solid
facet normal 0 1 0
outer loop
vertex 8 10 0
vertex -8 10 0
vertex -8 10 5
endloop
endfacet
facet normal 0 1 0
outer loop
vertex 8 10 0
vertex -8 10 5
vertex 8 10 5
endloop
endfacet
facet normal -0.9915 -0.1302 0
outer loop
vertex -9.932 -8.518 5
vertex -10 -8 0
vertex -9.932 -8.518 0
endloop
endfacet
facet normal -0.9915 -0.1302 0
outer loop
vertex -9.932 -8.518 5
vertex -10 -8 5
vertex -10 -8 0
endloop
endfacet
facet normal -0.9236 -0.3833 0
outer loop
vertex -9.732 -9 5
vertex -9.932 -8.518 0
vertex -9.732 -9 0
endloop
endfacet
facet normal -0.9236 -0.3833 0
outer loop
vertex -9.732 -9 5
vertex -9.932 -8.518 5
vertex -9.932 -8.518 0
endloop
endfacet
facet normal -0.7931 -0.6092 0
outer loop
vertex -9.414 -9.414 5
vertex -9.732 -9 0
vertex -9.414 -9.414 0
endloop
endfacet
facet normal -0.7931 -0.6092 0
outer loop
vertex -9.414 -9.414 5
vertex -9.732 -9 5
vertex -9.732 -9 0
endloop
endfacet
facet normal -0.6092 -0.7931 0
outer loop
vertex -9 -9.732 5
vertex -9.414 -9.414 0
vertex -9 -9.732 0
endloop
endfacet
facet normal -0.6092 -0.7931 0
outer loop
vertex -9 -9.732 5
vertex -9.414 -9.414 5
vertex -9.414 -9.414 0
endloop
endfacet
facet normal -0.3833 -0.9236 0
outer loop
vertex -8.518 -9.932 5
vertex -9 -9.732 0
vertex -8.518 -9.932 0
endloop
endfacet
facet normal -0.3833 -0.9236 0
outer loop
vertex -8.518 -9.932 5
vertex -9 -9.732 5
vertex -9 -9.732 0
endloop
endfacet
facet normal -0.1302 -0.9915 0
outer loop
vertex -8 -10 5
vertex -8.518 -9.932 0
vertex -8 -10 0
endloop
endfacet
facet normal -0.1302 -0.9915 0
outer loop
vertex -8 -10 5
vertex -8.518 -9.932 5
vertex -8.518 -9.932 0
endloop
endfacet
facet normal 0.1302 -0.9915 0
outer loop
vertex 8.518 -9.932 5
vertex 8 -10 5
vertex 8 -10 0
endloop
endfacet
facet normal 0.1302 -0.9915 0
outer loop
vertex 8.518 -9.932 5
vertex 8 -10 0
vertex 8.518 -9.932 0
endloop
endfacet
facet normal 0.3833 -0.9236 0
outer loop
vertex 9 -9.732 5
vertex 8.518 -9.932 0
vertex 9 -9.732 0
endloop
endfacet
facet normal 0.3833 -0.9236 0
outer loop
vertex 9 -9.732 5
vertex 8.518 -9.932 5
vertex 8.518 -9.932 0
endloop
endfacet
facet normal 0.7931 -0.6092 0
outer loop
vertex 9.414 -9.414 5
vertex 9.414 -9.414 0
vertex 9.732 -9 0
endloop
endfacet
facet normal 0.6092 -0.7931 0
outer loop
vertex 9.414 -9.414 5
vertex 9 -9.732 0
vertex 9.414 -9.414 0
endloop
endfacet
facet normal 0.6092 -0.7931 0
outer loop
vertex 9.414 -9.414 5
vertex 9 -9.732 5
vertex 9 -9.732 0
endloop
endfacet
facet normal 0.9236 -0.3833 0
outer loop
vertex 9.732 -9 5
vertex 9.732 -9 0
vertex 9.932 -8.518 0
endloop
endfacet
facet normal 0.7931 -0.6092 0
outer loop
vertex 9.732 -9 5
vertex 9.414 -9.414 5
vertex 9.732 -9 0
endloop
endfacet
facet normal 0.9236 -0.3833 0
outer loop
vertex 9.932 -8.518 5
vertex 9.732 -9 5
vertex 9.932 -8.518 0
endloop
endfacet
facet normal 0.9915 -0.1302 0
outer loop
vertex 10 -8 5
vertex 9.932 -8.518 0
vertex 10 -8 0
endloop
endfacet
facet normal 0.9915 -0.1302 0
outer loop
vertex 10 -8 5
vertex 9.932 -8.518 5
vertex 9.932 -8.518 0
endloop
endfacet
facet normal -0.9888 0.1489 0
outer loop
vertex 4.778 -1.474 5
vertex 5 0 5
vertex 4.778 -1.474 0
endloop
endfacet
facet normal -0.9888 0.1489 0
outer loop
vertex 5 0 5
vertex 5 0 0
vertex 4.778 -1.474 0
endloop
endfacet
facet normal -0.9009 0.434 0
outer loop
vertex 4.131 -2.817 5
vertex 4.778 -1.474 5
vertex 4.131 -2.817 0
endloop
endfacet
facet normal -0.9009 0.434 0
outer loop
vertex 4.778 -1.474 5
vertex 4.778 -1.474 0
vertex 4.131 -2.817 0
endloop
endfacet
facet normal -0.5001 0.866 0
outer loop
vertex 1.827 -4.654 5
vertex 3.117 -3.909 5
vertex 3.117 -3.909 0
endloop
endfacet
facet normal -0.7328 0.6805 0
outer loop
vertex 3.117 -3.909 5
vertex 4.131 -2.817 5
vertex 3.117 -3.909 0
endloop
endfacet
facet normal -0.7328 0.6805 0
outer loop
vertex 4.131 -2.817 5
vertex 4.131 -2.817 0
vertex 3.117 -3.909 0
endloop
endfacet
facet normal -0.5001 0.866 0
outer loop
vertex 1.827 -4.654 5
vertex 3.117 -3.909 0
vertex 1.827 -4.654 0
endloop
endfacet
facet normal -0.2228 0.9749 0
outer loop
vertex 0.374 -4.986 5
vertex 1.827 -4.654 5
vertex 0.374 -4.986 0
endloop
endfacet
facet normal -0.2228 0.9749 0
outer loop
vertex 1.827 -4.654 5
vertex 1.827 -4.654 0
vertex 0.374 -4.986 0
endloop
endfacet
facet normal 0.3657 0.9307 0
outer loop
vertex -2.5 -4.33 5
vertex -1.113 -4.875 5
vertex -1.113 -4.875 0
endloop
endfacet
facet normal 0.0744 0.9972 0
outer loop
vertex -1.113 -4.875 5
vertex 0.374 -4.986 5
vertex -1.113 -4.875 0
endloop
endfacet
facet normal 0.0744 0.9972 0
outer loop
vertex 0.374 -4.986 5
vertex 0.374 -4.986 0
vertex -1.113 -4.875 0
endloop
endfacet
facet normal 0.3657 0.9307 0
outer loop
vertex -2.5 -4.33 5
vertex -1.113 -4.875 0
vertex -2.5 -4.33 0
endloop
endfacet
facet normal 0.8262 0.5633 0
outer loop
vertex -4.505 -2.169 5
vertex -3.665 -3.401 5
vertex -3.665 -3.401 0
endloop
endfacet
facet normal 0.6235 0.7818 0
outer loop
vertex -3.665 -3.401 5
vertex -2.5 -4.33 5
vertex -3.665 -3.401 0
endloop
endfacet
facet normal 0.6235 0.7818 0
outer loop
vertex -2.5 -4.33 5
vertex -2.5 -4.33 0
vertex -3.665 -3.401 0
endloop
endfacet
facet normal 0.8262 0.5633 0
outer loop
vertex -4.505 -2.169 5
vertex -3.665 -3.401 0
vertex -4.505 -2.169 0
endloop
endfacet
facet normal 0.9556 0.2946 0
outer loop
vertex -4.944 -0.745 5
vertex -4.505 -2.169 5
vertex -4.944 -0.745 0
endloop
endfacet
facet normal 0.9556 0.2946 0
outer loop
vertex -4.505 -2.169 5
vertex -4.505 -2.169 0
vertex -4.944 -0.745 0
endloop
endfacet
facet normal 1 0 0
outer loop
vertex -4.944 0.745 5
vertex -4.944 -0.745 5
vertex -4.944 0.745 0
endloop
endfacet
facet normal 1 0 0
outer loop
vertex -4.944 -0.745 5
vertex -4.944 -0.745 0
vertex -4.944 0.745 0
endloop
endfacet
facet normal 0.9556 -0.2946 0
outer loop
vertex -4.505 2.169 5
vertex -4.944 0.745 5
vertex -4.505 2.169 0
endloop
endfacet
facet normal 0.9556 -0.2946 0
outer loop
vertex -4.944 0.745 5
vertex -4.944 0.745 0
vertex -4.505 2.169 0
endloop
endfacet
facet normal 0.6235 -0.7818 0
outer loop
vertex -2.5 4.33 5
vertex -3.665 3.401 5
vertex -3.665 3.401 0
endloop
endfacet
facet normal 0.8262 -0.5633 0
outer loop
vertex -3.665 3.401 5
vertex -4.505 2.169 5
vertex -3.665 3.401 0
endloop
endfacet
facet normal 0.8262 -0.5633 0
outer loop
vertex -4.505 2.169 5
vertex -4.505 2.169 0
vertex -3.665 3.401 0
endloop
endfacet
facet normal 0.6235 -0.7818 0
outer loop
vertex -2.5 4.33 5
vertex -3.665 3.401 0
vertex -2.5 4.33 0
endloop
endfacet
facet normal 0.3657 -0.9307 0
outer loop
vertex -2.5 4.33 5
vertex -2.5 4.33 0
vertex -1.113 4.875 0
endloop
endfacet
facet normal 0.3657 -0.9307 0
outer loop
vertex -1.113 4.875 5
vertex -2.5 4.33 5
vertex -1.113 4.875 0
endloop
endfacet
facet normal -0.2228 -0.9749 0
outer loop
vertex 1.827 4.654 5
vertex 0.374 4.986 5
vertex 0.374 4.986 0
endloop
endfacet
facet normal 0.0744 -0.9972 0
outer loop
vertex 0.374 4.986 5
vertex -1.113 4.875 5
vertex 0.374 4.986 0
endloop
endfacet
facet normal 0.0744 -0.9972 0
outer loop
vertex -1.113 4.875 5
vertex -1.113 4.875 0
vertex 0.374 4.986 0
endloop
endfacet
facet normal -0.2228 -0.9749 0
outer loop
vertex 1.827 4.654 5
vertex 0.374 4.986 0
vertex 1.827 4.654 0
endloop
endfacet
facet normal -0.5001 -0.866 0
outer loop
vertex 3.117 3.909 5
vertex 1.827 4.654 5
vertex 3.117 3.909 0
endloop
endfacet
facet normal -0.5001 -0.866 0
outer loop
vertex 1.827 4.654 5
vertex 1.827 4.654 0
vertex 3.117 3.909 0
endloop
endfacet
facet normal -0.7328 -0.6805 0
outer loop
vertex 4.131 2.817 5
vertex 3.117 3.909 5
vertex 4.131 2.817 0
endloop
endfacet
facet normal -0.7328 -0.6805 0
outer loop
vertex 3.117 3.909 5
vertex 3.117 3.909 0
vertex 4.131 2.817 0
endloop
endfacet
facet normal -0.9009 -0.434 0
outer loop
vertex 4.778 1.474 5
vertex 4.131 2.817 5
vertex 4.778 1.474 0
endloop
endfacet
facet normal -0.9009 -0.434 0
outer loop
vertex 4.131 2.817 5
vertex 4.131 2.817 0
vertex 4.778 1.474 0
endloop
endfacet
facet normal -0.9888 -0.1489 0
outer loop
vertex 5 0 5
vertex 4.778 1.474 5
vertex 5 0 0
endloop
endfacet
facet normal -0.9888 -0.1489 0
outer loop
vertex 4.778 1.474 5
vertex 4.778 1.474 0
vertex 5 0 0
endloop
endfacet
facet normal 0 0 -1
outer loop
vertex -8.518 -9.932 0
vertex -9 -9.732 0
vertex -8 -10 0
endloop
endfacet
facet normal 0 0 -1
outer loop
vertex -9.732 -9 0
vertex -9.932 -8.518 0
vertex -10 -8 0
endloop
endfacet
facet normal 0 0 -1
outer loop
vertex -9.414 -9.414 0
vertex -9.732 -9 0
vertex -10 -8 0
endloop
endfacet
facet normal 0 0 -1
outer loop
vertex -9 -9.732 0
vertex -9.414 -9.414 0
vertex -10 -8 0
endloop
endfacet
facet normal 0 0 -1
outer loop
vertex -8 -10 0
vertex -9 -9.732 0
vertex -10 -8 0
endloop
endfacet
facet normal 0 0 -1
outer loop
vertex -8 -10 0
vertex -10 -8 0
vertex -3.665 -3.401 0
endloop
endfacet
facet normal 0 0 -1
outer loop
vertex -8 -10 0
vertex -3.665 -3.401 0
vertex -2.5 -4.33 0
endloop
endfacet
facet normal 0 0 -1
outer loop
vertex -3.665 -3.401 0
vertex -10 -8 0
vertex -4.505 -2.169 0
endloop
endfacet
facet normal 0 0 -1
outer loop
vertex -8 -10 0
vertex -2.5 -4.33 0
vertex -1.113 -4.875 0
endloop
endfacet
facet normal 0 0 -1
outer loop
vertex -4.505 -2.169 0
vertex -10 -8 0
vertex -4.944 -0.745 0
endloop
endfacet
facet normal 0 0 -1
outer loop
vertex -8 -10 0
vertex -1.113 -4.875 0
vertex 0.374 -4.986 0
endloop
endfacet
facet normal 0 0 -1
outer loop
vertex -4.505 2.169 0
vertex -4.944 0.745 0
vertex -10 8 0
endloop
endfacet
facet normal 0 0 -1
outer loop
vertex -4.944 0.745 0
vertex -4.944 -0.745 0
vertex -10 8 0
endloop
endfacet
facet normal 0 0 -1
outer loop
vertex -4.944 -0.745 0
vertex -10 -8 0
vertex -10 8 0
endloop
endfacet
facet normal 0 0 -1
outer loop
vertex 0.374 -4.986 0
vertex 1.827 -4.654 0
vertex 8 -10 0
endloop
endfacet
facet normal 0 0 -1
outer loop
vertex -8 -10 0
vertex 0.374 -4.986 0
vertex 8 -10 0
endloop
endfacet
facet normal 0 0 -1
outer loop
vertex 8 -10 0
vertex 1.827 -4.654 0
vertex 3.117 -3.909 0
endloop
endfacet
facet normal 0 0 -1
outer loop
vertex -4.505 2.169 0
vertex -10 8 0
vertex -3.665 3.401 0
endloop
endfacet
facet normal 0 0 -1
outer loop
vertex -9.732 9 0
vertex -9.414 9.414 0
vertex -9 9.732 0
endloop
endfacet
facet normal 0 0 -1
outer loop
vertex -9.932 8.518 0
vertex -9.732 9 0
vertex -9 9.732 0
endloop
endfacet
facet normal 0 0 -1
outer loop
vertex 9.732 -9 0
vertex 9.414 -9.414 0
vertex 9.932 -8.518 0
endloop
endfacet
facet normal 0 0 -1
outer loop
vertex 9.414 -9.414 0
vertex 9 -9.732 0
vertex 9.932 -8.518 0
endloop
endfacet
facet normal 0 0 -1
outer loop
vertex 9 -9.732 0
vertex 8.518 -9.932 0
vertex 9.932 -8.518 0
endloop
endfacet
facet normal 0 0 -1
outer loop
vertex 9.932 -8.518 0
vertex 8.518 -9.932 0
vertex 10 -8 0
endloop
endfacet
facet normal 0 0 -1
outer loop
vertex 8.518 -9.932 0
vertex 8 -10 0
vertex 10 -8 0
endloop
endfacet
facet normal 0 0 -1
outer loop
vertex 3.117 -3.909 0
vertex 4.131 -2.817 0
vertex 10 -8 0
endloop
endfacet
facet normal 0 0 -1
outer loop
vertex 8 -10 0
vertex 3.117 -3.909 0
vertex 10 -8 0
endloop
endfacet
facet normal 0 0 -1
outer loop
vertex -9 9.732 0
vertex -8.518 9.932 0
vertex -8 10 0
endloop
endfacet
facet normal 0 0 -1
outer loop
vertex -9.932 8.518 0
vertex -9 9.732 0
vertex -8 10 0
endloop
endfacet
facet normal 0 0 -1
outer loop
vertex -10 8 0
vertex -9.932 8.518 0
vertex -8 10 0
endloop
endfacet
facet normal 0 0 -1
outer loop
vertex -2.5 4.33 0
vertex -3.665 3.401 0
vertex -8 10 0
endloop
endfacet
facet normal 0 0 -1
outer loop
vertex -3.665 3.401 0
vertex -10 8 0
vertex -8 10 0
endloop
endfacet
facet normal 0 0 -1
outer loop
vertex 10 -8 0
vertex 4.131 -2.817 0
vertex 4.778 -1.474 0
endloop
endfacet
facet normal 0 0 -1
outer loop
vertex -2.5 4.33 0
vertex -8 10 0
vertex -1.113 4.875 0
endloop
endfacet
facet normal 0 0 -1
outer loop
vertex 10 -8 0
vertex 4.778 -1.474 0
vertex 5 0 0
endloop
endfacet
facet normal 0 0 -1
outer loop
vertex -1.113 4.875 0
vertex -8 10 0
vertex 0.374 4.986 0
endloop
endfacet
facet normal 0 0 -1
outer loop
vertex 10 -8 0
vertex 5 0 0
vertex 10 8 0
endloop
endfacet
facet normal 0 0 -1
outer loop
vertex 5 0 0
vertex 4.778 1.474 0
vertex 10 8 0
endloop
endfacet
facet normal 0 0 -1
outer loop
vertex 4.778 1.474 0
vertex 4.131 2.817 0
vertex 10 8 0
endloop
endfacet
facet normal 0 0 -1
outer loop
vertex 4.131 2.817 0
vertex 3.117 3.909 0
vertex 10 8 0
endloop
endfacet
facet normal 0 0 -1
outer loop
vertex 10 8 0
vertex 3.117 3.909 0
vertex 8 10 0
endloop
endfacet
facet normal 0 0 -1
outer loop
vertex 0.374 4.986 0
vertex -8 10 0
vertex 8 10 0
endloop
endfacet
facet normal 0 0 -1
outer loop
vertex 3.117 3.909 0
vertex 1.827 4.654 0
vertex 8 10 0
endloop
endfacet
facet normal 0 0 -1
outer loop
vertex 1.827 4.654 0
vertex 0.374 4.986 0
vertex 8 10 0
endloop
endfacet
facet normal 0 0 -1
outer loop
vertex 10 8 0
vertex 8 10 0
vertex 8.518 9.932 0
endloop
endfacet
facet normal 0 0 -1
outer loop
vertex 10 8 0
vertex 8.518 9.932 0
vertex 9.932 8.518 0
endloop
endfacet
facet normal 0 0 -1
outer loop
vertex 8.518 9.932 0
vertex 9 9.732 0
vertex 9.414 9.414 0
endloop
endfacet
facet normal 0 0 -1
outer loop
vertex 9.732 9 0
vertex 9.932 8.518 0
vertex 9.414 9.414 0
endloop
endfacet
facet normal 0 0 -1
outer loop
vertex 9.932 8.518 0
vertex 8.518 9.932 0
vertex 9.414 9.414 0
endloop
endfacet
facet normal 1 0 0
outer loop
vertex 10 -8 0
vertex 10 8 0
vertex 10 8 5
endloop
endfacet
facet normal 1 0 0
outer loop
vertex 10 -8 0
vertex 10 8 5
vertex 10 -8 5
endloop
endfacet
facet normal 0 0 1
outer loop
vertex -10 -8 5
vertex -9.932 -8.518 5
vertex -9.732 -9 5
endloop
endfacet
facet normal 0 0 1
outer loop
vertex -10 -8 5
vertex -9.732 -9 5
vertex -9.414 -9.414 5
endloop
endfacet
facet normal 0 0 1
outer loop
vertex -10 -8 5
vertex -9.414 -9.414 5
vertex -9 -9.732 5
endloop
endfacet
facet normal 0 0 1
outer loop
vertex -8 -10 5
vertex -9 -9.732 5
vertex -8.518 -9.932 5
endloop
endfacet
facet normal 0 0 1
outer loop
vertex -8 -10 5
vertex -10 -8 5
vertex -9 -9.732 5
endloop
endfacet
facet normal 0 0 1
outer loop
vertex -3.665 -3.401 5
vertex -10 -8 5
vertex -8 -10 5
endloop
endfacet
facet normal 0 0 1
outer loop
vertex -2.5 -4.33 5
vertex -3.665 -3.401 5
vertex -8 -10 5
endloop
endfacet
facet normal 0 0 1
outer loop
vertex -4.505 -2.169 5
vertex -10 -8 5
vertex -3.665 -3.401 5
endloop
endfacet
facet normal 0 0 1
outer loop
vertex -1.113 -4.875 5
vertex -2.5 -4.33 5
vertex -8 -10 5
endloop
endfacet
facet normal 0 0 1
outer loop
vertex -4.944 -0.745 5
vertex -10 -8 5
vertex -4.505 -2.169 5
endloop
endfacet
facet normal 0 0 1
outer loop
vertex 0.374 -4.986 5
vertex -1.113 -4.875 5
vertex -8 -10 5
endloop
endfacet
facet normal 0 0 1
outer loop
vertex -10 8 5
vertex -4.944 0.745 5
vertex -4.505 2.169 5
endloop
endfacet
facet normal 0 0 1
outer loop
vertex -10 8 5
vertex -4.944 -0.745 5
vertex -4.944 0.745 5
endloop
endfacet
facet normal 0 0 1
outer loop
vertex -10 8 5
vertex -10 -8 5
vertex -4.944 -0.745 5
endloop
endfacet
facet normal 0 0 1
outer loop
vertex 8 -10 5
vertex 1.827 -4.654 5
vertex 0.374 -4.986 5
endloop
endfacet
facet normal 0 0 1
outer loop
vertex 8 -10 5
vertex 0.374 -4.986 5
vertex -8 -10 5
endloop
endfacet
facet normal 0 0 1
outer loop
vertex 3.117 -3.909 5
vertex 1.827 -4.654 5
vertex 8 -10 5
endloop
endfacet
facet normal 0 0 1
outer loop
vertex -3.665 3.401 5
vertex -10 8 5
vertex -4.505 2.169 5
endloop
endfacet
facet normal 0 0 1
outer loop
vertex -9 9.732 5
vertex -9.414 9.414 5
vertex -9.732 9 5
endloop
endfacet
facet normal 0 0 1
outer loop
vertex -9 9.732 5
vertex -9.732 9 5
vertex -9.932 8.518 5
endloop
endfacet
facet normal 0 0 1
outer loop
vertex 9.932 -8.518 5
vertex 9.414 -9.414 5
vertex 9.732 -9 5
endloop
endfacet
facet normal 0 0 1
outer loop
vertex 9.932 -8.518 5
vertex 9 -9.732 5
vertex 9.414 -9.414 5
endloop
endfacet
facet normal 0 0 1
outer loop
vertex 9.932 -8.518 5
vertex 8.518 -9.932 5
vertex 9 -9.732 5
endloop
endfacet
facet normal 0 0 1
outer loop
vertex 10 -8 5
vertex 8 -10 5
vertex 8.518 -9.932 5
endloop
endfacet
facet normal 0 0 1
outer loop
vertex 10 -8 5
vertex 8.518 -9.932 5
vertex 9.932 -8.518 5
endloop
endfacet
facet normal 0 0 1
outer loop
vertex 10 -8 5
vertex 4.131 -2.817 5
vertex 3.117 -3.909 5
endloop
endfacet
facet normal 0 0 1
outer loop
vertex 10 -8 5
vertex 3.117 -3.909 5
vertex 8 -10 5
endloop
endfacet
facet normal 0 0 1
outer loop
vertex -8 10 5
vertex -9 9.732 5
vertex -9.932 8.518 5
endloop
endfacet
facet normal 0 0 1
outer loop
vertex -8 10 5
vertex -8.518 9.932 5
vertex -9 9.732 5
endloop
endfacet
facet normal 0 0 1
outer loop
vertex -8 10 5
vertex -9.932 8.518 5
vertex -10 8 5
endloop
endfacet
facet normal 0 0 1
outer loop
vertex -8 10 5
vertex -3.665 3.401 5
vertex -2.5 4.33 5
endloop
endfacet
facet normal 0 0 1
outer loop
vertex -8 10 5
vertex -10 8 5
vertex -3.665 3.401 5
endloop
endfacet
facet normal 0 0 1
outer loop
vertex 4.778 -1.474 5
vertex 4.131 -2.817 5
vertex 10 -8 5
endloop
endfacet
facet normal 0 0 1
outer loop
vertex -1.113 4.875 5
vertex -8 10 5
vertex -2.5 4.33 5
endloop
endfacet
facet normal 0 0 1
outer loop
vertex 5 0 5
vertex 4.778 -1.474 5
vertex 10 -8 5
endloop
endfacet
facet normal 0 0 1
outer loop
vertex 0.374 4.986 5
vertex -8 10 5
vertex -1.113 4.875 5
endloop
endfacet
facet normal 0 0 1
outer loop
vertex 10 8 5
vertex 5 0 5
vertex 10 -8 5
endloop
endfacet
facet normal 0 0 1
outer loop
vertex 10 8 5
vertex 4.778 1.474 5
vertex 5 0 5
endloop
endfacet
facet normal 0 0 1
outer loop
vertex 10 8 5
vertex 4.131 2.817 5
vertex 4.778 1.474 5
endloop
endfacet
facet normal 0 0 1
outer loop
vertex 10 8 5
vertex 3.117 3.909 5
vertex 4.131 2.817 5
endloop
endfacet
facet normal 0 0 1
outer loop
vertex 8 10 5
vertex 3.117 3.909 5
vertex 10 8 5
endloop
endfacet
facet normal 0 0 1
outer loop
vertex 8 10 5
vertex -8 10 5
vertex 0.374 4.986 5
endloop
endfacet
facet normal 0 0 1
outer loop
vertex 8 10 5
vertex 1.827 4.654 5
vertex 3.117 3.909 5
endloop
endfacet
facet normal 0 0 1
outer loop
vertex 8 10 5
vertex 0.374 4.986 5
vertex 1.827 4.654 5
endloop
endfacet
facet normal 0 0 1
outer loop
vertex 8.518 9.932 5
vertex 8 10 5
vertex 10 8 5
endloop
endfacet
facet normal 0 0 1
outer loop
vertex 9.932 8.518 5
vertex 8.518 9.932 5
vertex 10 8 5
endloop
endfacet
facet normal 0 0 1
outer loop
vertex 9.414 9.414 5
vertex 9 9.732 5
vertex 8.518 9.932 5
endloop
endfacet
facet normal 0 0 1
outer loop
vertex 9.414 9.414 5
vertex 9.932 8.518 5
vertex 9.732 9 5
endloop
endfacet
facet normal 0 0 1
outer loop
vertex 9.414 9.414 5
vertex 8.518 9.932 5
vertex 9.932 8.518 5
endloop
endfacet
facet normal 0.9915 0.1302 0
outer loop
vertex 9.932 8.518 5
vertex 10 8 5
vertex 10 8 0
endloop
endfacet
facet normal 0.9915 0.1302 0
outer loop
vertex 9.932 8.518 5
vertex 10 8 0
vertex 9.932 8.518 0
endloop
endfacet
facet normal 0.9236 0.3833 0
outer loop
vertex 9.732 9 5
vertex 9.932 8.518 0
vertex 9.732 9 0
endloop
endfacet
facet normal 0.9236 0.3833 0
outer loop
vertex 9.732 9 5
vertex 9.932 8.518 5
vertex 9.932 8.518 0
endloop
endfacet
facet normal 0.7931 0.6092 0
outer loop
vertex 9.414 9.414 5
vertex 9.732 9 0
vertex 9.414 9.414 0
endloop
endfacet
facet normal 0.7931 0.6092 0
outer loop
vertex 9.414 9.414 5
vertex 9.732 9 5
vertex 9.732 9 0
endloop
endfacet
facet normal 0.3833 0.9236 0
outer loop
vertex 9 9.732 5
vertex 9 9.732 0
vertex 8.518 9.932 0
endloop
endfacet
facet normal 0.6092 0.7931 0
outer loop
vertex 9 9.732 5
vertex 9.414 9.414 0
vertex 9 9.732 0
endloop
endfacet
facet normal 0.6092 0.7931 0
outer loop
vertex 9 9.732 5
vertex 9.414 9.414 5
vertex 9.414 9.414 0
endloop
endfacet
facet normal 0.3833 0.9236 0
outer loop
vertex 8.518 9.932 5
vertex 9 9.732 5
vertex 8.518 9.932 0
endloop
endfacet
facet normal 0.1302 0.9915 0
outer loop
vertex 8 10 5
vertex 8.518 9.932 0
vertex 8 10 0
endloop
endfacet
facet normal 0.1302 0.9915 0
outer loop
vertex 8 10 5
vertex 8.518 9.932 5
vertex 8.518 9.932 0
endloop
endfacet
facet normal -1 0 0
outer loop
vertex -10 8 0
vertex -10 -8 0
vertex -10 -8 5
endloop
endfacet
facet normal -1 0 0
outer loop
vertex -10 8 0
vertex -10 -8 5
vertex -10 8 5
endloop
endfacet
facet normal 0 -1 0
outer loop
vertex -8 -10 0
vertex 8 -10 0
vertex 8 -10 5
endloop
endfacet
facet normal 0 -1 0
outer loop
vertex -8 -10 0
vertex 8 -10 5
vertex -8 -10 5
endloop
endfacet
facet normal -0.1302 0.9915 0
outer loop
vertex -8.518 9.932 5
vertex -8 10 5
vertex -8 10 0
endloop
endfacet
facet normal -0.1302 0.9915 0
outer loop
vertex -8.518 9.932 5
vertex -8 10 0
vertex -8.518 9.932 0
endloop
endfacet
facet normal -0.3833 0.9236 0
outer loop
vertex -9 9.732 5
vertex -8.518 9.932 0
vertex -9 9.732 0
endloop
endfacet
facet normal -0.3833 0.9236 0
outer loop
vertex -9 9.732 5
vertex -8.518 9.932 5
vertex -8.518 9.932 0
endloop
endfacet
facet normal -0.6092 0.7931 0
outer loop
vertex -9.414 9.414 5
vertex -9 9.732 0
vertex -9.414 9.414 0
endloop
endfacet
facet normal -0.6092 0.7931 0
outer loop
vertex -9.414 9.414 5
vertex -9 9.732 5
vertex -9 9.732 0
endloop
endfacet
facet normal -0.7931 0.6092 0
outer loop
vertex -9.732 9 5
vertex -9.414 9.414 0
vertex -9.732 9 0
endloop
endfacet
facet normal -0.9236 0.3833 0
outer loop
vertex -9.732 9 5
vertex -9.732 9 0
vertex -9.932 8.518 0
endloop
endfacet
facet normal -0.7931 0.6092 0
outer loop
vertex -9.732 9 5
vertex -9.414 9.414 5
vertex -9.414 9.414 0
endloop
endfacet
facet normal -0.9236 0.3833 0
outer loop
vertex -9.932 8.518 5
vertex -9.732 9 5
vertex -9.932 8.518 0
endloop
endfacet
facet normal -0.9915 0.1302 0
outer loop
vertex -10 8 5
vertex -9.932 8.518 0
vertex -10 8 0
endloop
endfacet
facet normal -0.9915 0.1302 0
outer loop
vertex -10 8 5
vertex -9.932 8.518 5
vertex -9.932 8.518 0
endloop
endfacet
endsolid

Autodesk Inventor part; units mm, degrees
ref_plane "YZ Plane" through (0, 0, 0) normal (1, 0, 0) x (0, 1, 0)
ref_plane "XZ Plane" through (0, 0, 0) normal (0, 1, 0) x (-1, 0, 0)
ref_plane "XY Plane" through (0, 0, 0) normal (0, 0, 1) x (1, 0, 0)
sketch "スケッチ1" plane through (0, 0, 0) normal (0, 0, 1) x (1, 0, 0)
  line L0 (-10, 10) -> (10, 10)
  line L1 (10, 10) -> (10, -10)
  line L2 (10, -10) -> (-10, -10)
  line L3 (-10, -10) -> (-10, 10)
  point P0 (0, 0)
  dimension "d0" = 20
  dimension "d1" = 20
  dimension "d2" = 10
  dimension "d3" = 10
extrude "押し出し1" add sketch "スケッチ1" along normal blind 5
sketch "スケッチ2" plane through (0, 0, 0) normal (0, 0, 1) x (1, 0, 0)
  circle A0 centre (0, 0) radius 5
  dimension "d6" = 10
extrude "押し出し2" cut sketch "スケッチ2" along normal blind 5
fillet "フィレット1" radius 2 4 edges at (10, 10, 2.5) (10, -10, 2.5) (-10, -10, 2.5) (-10, 10, 2.5)
properties part number "HbSensorCushion02" material "ゴム"
